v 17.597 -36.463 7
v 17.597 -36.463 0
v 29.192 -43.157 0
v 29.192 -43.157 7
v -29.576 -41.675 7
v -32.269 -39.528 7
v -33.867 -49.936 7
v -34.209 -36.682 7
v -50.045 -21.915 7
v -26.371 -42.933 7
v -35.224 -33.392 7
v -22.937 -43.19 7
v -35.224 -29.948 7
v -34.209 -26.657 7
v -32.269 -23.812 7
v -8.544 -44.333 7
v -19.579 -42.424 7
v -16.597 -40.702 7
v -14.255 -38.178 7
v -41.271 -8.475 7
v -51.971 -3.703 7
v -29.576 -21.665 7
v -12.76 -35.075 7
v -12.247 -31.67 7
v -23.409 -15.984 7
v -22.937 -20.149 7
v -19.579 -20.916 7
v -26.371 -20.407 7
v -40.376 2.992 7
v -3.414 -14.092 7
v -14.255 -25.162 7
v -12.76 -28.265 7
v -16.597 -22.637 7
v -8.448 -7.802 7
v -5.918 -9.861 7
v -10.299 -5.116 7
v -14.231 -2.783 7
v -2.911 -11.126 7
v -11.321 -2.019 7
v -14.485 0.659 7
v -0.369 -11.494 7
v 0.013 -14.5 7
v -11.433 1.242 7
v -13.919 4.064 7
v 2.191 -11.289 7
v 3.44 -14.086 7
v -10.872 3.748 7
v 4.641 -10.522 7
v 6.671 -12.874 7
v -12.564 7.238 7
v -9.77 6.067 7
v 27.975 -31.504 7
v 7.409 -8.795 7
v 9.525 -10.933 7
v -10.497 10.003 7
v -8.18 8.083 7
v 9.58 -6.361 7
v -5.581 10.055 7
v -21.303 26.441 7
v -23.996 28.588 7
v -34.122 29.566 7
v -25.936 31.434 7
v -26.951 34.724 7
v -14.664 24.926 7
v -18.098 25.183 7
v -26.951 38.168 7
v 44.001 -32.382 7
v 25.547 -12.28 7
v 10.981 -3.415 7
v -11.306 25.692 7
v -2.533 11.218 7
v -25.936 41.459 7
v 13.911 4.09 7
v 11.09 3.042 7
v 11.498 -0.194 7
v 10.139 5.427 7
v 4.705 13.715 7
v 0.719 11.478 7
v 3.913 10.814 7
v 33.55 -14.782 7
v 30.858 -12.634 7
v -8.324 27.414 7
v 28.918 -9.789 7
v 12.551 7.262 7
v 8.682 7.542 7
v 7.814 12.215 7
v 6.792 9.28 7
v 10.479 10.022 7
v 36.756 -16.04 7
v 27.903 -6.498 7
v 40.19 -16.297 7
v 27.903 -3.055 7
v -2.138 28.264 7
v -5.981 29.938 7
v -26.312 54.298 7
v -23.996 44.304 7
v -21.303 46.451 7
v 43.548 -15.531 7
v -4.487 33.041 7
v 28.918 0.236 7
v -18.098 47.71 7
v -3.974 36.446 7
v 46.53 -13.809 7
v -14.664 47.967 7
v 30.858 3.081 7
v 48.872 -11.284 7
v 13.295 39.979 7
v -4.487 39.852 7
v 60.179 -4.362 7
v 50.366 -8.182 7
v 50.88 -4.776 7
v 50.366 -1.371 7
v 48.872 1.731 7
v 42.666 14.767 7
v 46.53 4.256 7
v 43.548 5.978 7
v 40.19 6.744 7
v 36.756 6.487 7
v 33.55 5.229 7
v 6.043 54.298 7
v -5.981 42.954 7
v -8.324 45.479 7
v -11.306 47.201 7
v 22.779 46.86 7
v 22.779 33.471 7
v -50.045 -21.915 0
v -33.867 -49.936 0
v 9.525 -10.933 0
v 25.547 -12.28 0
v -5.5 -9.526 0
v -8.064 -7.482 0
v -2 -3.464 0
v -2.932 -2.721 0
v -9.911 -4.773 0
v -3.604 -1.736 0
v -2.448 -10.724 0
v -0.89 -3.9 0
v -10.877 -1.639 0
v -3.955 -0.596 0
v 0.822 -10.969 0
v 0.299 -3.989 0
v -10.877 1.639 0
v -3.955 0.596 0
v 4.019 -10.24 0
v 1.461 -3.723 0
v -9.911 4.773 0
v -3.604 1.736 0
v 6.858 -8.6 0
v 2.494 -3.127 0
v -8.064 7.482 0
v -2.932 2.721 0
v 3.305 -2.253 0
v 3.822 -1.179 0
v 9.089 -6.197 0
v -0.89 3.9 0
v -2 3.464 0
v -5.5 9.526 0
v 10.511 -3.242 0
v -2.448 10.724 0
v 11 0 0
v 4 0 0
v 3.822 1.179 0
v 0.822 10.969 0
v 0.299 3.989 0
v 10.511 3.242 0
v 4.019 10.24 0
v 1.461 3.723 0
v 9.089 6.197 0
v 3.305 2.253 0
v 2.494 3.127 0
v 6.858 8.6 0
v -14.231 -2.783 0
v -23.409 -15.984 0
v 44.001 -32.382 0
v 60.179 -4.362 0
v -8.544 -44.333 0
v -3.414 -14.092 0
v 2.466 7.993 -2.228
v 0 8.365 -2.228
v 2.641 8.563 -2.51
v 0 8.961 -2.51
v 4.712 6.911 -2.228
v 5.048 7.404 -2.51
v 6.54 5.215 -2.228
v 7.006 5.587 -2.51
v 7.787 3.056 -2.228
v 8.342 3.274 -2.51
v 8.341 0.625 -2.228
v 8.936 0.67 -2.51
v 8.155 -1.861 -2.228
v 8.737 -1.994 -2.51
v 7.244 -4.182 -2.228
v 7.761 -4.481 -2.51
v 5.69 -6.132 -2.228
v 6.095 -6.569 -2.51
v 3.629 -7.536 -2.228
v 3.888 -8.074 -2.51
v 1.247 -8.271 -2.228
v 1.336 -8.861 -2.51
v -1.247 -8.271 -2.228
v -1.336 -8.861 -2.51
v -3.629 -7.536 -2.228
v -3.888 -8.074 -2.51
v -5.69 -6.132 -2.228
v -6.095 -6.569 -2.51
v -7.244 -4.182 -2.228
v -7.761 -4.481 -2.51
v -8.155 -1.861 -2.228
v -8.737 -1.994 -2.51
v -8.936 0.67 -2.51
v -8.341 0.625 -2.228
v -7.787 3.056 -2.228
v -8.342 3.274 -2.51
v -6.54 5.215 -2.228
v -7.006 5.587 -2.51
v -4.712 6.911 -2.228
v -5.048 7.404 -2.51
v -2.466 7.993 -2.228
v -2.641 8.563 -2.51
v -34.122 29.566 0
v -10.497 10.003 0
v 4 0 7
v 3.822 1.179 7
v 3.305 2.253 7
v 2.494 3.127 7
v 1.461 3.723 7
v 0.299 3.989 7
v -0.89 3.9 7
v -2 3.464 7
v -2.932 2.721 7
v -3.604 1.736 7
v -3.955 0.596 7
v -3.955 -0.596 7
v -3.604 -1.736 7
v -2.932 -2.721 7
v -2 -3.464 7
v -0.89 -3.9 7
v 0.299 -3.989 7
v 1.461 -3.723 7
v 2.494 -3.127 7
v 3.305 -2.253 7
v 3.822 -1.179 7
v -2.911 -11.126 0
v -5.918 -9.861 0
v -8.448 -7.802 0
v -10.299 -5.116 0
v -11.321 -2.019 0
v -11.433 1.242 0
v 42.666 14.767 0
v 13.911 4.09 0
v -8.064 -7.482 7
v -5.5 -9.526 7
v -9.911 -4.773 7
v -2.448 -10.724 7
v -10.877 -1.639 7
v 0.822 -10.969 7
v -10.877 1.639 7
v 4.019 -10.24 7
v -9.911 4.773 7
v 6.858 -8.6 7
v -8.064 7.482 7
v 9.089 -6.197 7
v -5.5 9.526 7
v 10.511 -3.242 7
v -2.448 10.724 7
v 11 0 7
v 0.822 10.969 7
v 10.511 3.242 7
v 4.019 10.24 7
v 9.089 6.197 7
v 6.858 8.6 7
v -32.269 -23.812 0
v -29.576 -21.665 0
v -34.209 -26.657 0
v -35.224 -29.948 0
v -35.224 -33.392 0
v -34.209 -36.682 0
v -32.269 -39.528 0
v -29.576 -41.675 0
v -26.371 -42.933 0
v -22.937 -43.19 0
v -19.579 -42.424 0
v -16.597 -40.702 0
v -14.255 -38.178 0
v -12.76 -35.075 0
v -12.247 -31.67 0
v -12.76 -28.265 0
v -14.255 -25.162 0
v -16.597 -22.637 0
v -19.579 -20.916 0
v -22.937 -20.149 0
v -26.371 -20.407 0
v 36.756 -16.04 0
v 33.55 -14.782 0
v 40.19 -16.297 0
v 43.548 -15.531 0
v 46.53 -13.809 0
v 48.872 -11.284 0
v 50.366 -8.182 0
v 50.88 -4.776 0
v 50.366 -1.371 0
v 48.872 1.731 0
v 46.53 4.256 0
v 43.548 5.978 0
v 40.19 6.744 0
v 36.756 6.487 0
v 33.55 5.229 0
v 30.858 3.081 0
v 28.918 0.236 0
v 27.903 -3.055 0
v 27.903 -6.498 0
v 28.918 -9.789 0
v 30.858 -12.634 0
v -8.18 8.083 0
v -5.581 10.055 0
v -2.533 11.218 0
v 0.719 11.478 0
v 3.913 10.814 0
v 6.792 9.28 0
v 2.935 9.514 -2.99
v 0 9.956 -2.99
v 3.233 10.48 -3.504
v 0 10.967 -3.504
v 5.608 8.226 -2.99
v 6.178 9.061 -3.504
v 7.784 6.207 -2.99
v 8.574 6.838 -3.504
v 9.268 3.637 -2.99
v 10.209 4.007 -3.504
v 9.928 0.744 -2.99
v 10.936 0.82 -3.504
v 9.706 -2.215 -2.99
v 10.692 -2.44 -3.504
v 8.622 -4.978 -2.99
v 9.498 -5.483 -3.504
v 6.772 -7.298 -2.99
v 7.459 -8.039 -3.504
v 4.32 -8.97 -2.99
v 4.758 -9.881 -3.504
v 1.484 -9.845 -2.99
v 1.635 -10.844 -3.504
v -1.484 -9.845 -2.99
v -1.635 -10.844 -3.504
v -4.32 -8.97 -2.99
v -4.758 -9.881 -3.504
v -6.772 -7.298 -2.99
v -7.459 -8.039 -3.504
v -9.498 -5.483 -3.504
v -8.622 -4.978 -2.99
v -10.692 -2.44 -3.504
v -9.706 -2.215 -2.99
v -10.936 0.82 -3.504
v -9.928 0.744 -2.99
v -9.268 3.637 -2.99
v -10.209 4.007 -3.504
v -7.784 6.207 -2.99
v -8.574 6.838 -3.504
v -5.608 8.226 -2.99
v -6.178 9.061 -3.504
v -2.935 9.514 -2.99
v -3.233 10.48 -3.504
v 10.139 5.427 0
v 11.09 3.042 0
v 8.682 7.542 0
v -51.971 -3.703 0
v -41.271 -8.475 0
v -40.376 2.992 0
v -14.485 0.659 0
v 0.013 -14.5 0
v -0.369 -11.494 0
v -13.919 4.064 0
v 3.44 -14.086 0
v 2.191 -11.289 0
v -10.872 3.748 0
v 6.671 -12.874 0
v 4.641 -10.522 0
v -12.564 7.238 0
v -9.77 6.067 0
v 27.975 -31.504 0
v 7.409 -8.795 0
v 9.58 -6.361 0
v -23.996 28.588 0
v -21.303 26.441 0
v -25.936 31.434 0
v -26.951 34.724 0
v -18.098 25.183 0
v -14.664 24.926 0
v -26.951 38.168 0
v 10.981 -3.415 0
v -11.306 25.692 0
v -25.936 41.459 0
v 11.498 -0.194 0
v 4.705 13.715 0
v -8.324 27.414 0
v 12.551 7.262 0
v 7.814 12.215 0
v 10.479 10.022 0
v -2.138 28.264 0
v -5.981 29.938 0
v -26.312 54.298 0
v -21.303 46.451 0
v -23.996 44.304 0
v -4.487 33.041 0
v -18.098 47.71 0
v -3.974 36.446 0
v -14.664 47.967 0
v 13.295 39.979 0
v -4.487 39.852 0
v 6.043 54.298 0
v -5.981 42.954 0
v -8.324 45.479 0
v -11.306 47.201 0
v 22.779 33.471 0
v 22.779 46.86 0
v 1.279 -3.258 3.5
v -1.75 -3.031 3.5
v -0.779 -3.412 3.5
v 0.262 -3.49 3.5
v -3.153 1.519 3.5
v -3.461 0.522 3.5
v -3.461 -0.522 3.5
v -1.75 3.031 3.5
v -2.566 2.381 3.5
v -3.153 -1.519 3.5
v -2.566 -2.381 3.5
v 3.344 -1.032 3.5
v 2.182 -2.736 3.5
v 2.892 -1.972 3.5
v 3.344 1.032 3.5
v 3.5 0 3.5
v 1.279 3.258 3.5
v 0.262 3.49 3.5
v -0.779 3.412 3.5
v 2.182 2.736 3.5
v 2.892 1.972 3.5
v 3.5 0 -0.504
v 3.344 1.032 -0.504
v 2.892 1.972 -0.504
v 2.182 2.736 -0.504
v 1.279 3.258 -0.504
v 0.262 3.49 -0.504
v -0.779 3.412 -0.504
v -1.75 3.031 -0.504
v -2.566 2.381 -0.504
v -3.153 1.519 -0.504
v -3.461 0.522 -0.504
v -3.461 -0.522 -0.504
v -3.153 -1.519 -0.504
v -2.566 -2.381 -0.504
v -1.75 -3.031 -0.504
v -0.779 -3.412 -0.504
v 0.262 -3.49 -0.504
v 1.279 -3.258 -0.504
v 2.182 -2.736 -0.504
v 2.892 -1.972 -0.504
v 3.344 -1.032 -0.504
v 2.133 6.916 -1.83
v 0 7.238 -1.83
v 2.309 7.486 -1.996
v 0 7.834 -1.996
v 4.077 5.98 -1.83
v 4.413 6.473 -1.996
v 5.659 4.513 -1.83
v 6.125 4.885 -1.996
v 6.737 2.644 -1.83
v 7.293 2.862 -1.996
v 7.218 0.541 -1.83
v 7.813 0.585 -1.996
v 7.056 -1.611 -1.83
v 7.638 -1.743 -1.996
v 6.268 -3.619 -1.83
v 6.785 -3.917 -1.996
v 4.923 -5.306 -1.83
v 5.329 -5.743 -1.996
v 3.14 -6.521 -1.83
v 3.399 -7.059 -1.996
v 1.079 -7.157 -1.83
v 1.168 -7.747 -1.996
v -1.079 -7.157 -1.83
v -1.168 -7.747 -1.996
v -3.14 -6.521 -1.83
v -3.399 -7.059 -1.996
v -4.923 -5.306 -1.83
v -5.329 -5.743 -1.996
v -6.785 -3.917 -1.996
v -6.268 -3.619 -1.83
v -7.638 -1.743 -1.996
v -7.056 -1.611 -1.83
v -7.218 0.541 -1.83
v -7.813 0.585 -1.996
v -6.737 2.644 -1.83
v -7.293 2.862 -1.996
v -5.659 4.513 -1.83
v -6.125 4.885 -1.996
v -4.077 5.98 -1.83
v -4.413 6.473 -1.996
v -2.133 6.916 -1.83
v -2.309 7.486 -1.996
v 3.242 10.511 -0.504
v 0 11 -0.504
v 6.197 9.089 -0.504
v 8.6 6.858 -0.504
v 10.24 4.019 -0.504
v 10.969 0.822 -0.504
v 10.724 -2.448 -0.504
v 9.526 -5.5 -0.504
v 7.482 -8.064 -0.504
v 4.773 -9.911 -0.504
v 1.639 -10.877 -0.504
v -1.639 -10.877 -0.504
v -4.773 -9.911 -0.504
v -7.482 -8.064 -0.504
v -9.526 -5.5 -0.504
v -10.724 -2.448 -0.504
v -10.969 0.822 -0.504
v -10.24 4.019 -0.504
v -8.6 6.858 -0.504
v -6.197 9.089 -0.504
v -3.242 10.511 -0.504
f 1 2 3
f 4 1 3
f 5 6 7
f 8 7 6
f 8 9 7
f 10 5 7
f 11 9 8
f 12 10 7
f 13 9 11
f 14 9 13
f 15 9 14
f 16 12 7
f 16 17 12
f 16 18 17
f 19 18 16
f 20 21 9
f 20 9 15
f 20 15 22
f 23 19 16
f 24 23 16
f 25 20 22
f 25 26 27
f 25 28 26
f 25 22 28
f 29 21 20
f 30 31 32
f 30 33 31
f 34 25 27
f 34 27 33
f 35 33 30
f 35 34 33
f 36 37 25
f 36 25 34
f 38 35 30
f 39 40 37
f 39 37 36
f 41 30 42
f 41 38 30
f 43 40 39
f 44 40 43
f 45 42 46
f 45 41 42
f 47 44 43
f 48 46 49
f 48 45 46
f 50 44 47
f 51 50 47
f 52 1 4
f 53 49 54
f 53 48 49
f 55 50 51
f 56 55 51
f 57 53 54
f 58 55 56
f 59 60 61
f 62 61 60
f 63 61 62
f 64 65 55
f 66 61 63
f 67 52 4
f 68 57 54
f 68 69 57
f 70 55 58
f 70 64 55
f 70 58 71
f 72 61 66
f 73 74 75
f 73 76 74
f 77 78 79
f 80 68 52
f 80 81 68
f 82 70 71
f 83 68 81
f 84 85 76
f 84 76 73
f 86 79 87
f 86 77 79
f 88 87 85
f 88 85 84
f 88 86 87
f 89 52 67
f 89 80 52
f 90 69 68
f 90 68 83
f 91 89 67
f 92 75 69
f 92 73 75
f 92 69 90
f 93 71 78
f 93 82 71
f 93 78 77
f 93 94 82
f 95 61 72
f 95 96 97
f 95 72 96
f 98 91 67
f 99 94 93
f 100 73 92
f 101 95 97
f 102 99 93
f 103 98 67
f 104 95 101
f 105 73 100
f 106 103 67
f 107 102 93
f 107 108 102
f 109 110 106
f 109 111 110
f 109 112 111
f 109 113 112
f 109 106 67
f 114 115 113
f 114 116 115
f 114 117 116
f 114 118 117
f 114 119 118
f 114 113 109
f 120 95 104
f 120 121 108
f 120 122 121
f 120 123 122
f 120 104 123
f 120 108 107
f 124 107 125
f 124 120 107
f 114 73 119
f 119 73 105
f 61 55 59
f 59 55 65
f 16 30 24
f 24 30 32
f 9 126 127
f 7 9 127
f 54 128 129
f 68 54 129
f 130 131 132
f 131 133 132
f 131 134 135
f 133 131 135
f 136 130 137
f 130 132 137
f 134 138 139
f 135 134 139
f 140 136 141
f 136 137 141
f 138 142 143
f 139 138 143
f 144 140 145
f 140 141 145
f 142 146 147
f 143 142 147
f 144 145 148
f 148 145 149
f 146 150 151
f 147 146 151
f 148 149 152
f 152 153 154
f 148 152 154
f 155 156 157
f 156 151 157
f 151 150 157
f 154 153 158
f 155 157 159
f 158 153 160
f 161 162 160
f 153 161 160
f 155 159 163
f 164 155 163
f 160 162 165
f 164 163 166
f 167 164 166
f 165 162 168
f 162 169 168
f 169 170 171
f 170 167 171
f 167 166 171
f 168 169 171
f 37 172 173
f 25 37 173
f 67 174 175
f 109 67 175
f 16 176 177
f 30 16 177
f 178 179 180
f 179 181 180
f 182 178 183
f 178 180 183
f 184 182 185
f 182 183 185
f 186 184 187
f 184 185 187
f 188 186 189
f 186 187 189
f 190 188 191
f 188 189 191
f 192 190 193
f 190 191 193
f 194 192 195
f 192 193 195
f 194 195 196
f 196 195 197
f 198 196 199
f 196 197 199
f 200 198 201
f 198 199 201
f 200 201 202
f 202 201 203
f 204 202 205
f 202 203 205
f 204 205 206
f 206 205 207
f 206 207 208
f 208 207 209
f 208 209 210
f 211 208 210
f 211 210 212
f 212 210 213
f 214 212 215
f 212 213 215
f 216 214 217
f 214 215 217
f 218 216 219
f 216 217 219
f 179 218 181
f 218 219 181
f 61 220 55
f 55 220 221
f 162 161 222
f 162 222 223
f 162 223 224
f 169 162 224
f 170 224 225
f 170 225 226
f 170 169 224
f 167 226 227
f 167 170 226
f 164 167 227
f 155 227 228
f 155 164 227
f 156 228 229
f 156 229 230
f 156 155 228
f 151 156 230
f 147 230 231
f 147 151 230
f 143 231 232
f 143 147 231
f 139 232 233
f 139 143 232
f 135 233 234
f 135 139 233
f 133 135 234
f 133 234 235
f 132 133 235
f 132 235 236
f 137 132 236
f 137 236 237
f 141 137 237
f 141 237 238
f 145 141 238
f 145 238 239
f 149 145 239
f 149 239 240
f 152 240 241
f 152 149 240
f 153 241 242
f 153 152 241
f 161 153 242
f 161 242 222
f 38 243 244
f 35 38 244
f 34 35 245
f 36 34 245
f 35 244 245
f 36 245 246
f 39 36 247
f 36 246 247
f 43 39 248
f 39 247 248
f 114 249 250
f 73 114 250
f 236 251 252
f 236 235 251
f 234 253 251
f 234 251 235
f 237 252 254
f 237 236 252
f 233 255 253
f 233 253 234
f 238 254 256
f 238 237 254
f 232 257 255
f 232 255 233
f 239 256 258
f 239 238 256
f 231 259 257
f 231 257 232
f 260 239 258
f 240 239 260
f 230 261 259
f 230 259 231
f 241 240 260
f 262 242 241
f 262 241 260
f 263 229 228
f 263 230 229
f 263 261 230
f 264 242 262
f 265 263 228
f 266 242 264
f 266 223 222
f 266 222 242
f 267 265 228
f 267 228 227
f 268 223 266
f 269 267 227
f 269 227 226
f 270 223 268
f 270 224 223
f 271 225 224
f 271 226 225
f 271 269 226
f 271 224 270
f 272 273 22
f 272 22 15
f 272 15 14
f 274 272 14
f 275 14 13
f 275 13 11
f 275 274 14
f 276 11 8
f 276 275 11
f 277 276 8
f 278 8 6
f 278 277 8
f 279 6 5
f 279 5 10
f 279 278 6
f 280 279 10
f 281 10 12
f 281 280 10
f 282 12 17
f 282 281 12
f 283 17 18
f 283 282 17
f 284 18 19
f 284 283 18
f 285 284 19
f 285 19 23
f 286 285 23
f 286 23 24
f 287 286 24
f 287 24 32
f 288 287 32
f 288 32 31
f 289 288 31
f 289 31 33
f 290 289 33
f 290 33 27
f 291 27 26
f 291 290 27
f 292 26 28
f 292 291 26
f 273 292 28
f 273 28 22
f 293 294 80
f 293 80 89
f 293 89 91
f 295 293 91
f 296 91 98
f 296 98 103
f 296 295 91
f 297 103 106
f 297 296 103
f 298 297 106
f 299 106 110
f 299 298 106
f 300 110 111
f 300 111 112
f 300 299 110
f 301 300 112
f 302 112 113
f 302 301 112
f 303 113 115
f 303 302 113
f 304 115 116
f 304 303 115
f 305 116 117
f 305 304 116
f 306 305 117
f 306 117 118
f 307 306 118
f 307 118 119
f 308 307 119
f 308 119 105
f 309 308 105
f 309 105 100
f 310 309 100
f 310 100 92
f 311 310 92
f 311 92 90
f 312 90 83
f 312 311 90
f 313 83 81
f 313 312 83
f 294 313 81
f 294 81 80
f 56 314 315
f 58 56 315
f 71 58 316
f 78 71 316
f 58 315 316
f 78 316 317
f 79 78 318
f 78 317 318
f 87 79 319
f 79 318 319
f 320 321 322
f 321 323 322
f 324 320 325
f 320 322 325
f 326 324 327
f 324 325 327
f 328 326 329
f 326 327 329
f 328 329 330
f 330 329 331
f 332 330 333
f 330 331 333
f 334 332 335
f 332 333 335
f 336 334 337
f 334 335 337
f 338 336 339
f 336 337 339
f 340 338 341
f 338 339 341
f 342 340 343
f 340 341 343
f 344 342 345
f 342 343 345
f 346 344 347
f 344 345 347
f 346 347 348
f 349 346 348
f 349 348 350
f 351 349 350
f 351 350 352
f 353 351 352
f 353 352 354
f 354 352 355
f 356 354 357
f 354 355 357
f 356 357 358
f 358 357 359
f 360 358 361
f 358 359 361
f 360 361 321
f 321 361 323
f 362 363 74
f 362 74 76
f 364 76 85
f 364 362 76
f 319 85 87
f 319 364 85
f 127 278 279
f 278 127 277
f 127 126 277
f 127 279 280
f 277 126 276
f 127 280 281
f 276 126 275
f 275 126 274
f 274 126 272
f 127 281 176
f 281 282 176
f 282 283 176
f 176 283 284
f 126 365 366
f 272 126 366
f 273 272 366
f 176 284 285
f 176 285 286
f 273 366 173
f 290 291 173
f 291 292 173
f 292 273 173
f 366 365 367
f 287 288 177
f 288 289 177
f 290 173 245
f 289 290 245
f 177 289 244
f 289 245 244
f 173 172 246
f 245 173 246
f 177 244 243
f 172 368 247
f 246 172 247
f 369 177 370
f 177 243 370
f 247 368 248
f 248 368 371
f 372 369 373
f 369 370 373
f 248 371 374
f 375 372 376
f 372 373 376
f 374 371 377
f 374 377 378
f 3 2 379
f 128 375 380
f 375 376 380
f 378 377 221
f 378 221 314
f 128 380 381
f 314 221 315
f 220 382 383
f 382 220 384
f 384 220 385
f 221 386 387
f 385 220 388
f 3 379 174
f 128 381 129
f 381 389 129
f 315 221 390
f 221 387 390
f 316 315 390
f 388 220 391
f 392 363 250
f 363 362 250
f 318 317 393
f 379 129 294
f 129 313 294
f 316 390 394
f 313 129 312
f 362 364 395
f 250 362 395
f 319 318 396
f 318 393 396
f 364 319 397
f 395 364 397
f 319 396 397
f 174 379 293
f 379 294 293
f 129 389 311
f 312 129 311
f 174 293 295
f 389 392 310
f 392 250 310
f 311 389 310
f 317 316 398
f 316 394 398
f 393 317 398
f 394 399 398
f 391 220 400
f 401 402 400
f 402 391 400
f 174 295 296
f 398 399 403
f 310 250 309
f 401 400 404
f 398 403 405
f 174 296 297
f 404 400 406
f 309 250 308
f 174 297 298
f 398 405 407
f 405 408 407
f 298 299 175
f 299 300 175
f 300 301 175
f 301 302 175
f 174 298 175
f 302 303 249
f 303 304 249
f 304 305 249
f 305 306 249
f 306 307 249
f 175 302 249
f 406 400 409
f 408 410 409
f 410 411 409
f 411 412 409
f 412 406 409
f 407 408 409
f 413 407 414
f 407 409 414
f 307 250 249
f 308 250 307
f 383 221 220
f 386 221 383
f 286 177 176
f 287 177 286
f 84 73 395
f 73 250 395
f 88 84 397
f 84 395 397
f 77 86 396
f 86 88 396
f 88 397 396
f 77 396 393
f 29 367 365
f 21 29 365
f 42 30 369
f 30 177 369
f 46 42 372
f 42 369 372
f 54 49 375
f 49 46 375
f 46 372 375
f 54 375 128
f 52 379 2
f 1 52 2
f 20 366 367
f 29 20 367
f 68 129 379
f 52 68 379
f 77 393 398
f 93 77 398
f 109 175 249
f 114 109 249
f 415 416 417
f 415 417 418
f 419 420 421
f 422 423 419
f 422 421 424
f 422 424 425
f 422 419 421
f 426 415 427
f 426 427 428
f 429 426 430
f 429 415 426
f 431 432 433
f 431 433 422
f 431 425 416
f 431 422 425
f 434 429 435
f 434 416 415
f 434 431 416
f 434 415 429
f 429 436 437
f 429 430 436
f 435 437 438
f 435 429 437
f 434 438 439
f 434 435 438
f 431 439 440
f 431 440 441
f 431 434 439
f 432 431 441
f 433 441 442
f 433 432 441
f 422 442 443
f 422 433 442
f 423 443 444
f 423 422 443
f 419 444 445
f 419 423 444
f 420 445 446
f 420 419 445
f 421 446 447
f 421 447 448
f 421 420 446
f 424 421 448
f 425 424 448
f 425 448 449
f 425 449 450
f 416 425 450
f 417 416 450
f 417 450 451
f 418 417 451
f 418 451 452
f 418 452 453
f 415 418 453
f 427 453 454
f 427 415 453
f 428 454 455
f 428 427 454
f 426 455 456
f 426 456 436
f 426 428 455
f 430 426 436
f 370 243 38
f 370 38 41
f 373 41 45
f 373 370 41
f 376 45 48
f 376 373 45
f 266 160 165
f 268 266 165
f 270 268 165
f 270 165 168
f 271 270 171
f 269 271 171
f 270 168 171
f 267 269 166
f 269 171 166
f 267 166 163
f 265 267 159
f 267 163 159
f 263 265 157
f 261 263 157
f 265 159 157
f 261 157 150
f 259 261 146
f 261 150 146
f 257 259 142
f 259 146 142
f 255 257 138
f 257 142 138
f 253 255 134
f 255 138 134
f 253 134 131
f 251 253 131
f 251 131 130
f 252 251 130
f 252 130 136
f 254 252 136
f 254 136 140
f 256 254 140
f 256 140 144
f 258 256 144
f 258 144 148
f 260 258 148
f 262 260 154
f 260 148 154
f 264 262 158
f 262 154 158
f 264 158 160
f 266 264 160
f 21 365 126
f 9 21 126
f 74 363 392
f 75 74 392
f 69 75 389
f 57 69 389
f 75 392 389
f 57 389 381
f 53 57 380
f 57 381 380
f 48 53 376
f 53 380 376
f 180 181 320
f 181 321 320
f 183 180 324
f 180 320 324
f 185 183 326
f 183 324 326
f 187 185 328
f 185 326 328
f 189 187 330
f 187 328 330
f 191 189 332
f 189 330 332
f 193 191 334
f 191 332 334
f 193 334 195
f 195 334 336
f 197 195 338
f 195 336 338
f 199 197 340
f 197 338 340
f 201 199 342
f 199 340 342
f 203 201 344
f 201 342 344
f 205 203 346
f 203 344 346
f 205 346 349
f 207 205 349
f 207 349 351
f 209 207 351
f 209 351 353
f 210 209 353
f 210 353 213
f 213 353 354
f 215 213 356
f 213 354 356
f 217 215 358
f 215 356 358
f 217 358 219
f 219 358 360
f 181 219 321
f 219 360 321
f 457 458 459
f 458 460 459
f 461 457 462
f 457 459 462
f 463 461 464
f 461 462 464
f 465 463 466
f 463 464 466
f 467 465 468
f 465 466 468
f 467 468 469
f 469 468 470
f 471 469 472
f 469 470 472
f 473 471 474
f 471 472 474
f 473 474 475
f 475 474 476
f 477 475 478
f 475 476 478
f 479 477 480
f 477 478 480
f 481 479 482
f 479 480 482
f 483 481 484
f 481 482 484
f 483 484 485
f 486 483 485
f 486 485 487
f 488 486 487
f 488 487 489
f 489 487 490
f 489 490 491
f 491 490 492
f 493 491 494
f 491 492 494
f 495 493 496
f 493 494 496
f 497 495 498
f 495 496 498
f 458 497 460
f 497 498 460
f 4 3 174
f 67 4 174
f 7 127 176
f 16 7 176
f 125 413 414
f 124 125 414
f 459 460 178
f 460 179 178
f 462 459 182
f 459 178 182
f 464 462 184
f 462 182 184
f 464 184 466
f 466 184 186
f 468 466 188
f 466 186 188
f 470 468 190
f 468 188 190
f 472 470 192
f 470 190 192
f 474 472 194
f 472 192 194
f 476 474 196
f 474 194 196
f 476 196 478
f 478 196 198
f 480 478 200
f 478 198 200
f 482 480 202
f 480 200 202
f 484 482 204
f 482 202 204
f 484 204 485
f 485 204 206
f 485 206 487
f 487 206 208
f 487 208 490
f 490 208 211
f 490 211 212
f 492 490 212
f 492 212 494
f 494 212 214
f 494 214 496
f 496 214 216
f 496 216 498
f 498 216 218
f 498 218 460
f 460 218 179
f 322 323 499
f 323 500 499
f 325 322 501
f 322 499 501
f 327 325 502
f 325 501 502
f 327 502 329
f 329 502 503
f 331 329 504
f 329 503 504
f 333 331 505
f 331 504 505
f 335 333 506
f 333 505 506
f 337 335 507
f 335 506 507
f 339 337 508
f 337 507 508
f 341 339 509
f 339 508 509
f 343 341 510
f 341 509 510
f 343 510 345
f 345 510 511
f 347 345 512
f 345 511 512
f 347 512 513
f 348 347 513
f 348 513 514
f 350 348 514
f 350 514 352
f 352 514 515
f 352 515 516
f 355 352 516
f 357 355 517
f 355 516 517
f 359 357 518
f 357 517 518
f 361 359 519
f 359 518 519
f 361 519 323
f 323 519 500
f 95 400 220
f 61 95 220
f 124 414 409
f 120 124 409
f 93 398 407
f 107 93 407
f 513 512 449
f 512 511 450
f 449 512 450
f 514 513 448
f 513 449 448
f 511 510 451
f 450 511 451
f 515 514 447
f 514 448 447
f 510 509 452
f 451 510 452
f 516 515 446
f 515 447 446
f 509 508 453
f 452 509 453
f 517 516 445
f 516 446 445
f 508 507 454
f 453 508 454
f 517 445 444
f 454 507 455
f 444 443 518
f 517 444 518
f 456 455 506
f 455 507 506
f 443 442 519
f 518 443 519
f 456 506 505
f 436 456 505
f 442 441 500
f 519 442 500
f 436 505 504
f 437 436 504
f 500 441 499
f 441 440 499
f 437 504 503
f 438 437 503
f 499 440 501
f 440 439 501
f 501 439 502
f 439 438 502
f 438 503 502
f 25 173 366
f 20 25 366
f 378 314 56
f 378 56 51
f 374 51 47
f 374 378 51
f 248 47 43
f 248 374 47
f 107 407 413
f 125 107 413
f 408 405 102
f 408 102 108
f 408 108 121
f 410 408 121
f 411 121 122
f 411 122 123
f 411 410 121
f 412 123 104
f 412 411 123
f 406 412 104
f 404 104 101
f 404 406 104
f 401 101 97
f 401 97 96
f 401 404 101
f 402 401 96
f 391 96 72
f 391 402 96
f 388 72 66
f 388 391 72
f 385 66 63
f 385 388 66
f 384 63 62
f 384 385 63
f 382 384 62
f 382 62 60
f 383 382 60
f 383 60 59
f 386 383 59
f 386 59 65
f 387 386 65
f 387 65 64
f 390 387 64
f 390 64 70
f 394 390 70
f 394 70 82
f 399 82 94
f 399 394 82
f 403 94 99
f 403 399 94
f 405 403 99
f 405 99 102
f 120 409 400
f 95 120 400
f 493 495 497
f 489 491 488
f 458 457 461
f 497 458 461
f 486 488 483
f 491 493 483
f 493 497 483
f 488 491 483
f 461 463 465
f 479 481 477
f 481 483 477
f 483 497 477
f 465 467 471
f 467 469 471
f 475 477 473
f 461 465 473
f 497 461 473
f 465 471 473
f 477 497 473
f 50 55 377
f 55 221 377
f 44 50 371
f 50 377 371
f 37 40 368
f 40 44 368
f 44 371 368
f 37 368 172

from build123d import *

# Parameters (mm, degrees)
F0_R            = 11
F0_R_2          = 4
F1_DEPTH        = 7
F3_R            = 14.5
F3_R_2          = 11.5
F4_DEPTH        = 7
F2_R            = 11.5528949888
F5_DEPTH        = 7
F5_COPIES_COUNT = 3
F6_R            = 3.4998709427
F7_DEPTH        = 3.5
F8_DEPTH        = 1


# Not quite as in the source:
# - a pattern or mirror of a feature is missing from the dataset's text; its kind, count and spacing are read off the source's solid


with BuildPart() as f1:
    # F0 (on Top) → F1 (new body)
    with BuildSketch(Plane.XY):
        Circle(F0_R)
        Circle(F0_R_2, mode=Mode.SUBTRACT)
    extrude(amount=F1_DEPTH)


with BuildPart() as f4:
    # F3 (on Top) → F4 (new body)
    with BuildSketch(Plane.XY):
        Circle(F3_R)
        Circle(F3_R_2, mode=Mode.SUBTRACT)
    extrude(amount=F4_DEPTH)

    # F2 (on Top) → F5 (join)
    with BuildSketch(Plane.XY):
        with BuildLine():
            ThreePointArc((-8.1796808061, 8.0834907009), (-0.9163388311, 11.4634341777), (6.7916970403, 9.2802398305))
            Line((6.7916970403, 9.2802398305), (-2.1384290885, 28.2644629478))
            Line((-2.1384290885, 28.2644629478), (13.2954539731, 39.9793423712))
            Line((13.2954539731, 39.9793423712), (22.7789282799, 33.4710739553))
            Line((22.7789282799, 33.4710739553), (22.7789282799, 46.8595065176))
            Line((22.7789282799, 46.8595065176), (6.0433889739, 54.2975254357))
            Line((6.0433889739, 54.2975254357), (-26.3119842857, 54.2975254357))
            Line((-26.3119842857, 54.2975254357), (-34.1219007969, 29.566116631))
            Line((-34.1219007969, 29.566116631), (-8.1796808061, 8.0834907009))
        make_face()
        with Locations((-15.5268600211, 36.4462845027)):
            Circle(F2_R, mode=Mode.SUBTRACT)
    f5 = extrude(amount=F5_DEPTH)

    # F5_copies: F5 ×3 about axis
    f5_copies_axis = Axis((0, 0, 0), (0, 0, 1))
    for i in range(1, F5_COPIES_COUNT):
        add(f5.rotate(f5_copies_axis, i * 360 / F5_COPIES_COUNT))


with BuildPart() as f7:
    # F6 (on Top) → F7 (new body)
    with BuildSketch(Plane.XY):
        Circle(F6_R)
    extrude(amount=F7_DEPTH)

    # F8 (add): a face of the model
    f8_faces = [f7.faces().sort_by_distance(p)[0] for p in [
        (0, 0, 0),
    ]]
    extrude(f8_faces, amount=F8_DEPTH)

    # F9 (on Right) → F10 (revolve)
    with BuildSketch(Plane.YZ):
        Polygon((10.9668523421, -3.5042045906), (11, -0.5043877241), (0, -0.5043877241), (0, -1.8302736931), (7.2377983444, -1.8302736931), (7.8344469729, -1.9960094697), (8.3648014024, -2.2280394454), (8.9614500308, -2.5097902099), (9.9558646908, -2.9904239901), align=None)
    revolve(axis=Axis((0, 0, -1.1673307086), (0, 0, -1)))


solid = Compound([f1.part, f4.part, f7.part])
